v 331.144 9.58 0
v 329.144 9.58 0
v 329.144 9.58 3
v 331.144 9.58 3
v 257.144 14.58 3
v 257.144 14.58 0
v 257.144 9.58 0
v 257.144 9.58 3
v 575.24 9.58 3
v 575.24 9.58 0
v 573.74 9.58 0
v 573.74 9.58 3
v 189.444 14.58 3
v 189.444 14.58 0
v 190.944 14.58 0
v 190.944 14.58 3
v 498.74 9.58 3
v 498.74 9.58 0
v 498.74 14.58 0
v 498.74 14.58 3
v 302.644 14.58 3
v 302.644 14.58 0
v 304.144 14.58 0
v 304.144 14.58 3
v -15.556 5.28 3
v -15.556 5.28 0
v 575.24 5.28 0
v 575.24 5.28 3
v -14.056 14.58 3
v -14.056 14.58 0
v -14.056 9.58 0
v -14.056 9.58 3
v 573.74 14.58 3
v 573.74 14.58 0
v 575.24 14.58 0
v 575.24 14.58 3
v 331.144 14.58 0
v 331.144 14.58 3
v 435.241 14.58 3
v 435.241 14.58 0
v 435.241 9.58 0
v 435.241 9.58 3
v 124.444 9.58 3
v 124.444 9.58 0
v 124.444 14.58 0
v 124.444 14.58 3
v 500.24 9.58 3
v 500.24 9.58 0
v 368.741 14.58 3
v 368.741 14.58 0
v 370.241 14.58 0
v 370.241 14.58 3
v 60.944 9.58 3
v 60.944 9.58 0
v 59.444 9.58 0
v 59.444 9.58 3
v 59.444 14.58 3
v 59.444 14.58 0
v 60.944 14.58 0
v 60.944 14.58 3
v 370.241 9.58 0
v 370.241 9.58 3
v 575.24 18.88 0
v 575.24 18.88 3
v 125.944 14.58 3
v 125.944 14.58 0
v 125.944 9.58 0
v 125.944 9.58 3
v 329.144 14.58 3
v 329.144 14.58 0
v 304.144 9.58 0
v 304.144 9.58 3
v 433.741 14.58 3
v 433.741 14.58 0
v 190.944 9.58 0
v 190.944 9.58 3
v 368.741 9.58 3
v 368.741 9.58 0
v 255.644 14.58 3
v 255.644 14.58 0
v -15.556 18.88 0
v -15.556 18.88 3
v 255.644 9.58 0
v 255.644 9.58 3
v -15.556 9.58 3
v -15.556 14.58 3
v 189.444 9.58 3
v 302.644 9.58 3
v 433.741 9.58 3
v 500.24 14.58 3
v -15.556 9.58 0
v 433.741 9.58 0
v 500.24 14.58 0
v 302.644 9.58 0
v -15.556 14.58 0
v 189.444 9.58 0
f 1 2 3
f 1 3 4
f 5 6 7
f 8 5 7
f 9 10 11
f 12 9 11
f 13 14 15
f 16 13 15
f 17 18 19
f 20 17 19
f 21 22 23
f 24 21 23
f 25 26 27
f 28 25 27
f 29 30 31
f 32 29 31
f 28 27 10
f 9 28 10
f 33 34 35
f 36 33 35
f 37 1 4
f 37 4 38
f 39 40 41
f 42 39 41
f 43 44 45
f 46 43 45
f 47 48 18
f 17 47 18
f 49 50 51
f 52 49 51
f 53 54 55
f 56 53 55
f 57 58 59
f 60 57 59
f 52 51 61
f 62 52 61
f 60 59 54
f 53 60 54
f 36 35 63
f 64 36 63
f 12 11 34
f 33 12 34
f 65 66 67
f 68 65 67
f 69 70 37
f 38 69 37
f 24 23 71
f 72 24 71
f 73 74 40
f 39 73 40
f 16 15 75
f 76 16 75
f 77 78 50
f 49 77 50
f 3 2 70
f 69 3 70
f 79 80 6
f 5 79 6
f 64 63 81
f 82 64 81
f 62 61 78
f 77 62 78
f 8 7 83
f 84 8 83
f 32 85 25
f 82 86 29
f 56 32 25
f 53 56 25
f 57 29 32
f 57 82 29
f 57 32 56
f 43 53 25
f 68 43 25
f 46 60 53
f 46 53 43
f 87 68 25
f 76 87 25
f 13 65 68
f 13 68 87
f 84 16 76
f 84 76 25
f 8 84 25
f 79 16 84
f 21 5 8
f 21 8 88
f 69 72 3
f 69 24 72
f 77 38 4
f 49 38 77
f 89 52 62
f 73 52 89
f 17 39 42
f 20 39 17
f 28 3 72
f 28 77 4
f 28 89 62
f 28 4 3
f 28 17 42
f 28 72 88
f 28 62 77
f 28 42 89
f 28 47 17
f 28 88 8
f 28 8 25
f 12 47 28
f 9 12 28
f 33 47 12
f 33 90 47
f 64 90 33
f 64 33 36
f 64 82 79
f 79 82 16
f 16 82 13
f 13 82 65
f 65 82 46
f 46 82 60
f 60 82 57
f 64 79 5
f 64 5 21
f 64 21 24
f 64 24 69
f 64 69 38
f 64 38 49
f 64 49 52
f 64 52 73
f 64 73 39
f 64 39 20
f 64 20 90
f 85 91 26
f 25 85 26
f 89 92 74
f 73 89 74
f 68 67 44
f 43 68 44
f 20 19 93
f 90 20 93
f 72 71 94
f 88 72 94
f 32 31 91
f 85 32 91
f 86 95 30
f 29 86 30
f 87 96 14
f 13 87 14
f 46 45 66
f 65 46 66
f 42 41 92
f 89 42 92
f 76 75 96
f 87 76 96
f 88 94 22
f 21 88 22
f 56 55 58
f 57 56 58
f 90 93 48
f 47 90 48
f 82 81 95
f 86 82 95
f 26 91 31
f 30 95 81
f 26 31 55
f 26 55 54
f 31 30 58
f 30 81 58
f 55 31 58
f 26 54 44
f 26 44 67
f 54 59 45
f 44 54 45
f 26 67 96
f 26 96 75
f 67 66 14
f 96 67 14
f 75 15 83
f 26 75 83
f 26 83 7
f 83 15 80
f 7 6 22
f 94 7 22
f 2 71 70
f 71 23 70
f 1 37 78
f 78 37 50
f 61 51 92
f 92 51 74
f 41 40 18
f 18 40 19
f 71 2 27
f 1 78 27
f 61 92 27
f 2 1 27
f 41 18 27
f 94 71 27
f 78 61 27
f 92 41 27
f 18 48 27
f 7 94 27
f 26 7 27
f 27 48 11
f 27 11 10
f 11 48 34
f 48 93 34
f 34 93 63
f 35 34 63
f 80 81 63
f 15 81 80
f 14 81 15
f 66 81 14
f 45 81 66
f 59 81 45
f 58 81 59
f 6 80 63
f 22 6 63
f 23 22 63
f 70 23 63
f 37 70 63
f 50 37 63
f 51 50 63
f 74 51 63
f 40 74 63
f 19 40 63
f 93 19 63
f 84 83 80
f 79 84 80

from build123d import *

# Parameters (mm, degrees)
MODEL_W         = 2
MODEL_H         = 5
EXTRUDE_2_DEPTH = 3


with BuildPart() as part:
    # Model → 凸台-拉伸2 (new body)
    with BuildSketch(Plane.XY):
        Polygon((575.240468194, 18.879736589), (-15.555770015, 18.879736589), (-15.555770015, 14.579736589), (-14.055770015, 14.579736589), (-14.055770015, 9.579736589), (-15.555770015, 9.579736589), (-15.555770015, 5.279736589), (575.240468194, 5.279736589), (575.240468194, 9.579736589), (573.740468194, 9.579736589), (573.740468194, 14.579736589), (575.240468194, 14.579736589), align=None)
        with Locations((330.144145491, 12.079736589)):
            Rectangle(MODEL_W, MODEL_H, mode=Mode.SUBTRACT)
        Polygon((59.444206817, 12.079736589), (59.444206817, 14.579736589), (60.944206817, 14.579736589), (60.944206817, 9.579736589), (59.444206817, 9.579736589), align=None, mode=Mode.SUBTRACT)
        Polygon((124.444183648, 12.079736589), (124.444183648, 14.579736589), (125.944183648, 14.579736589), (125.944183648, 9.579736589), (124.444183648, 9.579736589), align=None, mode=Mode.SUBTRACT)
        Polygon((189.444160479, 12.079736589), (189.444160479, 14.579736589), (190.944160479, 14.579736589), (190.944160479, 9.579736589), (189.444160479, 9.579736589), align=None, mode=Mode.SUBTRACT)
        Polygon((255.644137473, 12.079741496), (255.644137473, 14.579741496), (257.144137473, 14.579741496), (257.144137473, 9.579741496), (255.644137473, 9.579741496), align=None, mode=Mode.SUBTRACT)
        Polygon((302.644147585, 12.079741496), (302.644147585, 14.579741496), (304.144147585, 14.579741496), (304.144147585, 9.579741496), (302.644147585, 9.579741496), align=None, mode=Mode.SUBTRACT)
        Polygon((368.740539794, 12.079741496), (368.740539794, 14.579741496), (370.240539794, 14.579741496), (370.240539794, 9.579741496), (368.740539794, 9.579741496), align=None, mode=Mode.SUBTRACT)
        Polygon((433.740516625, 12.079741496), (433.740516625, 14.579741496), (435.240516625, 14.579741496), (435.240516625, 9.579741496), (433.740516625, 9.579741496), align=None, mode=Mode.SUBTRACT)
        Polygon((498.740493457, 12.079741496), (498.740493457, 14.579741496), (500.240493457, 14.579741496), (500.240493457, 9.579741496), (498.740493457, 9.579741496), align=None, mode=Mode.SUBTRACT)
    extrude(amount=EXTRUDE_2_DEPTH)


solid = part.part
